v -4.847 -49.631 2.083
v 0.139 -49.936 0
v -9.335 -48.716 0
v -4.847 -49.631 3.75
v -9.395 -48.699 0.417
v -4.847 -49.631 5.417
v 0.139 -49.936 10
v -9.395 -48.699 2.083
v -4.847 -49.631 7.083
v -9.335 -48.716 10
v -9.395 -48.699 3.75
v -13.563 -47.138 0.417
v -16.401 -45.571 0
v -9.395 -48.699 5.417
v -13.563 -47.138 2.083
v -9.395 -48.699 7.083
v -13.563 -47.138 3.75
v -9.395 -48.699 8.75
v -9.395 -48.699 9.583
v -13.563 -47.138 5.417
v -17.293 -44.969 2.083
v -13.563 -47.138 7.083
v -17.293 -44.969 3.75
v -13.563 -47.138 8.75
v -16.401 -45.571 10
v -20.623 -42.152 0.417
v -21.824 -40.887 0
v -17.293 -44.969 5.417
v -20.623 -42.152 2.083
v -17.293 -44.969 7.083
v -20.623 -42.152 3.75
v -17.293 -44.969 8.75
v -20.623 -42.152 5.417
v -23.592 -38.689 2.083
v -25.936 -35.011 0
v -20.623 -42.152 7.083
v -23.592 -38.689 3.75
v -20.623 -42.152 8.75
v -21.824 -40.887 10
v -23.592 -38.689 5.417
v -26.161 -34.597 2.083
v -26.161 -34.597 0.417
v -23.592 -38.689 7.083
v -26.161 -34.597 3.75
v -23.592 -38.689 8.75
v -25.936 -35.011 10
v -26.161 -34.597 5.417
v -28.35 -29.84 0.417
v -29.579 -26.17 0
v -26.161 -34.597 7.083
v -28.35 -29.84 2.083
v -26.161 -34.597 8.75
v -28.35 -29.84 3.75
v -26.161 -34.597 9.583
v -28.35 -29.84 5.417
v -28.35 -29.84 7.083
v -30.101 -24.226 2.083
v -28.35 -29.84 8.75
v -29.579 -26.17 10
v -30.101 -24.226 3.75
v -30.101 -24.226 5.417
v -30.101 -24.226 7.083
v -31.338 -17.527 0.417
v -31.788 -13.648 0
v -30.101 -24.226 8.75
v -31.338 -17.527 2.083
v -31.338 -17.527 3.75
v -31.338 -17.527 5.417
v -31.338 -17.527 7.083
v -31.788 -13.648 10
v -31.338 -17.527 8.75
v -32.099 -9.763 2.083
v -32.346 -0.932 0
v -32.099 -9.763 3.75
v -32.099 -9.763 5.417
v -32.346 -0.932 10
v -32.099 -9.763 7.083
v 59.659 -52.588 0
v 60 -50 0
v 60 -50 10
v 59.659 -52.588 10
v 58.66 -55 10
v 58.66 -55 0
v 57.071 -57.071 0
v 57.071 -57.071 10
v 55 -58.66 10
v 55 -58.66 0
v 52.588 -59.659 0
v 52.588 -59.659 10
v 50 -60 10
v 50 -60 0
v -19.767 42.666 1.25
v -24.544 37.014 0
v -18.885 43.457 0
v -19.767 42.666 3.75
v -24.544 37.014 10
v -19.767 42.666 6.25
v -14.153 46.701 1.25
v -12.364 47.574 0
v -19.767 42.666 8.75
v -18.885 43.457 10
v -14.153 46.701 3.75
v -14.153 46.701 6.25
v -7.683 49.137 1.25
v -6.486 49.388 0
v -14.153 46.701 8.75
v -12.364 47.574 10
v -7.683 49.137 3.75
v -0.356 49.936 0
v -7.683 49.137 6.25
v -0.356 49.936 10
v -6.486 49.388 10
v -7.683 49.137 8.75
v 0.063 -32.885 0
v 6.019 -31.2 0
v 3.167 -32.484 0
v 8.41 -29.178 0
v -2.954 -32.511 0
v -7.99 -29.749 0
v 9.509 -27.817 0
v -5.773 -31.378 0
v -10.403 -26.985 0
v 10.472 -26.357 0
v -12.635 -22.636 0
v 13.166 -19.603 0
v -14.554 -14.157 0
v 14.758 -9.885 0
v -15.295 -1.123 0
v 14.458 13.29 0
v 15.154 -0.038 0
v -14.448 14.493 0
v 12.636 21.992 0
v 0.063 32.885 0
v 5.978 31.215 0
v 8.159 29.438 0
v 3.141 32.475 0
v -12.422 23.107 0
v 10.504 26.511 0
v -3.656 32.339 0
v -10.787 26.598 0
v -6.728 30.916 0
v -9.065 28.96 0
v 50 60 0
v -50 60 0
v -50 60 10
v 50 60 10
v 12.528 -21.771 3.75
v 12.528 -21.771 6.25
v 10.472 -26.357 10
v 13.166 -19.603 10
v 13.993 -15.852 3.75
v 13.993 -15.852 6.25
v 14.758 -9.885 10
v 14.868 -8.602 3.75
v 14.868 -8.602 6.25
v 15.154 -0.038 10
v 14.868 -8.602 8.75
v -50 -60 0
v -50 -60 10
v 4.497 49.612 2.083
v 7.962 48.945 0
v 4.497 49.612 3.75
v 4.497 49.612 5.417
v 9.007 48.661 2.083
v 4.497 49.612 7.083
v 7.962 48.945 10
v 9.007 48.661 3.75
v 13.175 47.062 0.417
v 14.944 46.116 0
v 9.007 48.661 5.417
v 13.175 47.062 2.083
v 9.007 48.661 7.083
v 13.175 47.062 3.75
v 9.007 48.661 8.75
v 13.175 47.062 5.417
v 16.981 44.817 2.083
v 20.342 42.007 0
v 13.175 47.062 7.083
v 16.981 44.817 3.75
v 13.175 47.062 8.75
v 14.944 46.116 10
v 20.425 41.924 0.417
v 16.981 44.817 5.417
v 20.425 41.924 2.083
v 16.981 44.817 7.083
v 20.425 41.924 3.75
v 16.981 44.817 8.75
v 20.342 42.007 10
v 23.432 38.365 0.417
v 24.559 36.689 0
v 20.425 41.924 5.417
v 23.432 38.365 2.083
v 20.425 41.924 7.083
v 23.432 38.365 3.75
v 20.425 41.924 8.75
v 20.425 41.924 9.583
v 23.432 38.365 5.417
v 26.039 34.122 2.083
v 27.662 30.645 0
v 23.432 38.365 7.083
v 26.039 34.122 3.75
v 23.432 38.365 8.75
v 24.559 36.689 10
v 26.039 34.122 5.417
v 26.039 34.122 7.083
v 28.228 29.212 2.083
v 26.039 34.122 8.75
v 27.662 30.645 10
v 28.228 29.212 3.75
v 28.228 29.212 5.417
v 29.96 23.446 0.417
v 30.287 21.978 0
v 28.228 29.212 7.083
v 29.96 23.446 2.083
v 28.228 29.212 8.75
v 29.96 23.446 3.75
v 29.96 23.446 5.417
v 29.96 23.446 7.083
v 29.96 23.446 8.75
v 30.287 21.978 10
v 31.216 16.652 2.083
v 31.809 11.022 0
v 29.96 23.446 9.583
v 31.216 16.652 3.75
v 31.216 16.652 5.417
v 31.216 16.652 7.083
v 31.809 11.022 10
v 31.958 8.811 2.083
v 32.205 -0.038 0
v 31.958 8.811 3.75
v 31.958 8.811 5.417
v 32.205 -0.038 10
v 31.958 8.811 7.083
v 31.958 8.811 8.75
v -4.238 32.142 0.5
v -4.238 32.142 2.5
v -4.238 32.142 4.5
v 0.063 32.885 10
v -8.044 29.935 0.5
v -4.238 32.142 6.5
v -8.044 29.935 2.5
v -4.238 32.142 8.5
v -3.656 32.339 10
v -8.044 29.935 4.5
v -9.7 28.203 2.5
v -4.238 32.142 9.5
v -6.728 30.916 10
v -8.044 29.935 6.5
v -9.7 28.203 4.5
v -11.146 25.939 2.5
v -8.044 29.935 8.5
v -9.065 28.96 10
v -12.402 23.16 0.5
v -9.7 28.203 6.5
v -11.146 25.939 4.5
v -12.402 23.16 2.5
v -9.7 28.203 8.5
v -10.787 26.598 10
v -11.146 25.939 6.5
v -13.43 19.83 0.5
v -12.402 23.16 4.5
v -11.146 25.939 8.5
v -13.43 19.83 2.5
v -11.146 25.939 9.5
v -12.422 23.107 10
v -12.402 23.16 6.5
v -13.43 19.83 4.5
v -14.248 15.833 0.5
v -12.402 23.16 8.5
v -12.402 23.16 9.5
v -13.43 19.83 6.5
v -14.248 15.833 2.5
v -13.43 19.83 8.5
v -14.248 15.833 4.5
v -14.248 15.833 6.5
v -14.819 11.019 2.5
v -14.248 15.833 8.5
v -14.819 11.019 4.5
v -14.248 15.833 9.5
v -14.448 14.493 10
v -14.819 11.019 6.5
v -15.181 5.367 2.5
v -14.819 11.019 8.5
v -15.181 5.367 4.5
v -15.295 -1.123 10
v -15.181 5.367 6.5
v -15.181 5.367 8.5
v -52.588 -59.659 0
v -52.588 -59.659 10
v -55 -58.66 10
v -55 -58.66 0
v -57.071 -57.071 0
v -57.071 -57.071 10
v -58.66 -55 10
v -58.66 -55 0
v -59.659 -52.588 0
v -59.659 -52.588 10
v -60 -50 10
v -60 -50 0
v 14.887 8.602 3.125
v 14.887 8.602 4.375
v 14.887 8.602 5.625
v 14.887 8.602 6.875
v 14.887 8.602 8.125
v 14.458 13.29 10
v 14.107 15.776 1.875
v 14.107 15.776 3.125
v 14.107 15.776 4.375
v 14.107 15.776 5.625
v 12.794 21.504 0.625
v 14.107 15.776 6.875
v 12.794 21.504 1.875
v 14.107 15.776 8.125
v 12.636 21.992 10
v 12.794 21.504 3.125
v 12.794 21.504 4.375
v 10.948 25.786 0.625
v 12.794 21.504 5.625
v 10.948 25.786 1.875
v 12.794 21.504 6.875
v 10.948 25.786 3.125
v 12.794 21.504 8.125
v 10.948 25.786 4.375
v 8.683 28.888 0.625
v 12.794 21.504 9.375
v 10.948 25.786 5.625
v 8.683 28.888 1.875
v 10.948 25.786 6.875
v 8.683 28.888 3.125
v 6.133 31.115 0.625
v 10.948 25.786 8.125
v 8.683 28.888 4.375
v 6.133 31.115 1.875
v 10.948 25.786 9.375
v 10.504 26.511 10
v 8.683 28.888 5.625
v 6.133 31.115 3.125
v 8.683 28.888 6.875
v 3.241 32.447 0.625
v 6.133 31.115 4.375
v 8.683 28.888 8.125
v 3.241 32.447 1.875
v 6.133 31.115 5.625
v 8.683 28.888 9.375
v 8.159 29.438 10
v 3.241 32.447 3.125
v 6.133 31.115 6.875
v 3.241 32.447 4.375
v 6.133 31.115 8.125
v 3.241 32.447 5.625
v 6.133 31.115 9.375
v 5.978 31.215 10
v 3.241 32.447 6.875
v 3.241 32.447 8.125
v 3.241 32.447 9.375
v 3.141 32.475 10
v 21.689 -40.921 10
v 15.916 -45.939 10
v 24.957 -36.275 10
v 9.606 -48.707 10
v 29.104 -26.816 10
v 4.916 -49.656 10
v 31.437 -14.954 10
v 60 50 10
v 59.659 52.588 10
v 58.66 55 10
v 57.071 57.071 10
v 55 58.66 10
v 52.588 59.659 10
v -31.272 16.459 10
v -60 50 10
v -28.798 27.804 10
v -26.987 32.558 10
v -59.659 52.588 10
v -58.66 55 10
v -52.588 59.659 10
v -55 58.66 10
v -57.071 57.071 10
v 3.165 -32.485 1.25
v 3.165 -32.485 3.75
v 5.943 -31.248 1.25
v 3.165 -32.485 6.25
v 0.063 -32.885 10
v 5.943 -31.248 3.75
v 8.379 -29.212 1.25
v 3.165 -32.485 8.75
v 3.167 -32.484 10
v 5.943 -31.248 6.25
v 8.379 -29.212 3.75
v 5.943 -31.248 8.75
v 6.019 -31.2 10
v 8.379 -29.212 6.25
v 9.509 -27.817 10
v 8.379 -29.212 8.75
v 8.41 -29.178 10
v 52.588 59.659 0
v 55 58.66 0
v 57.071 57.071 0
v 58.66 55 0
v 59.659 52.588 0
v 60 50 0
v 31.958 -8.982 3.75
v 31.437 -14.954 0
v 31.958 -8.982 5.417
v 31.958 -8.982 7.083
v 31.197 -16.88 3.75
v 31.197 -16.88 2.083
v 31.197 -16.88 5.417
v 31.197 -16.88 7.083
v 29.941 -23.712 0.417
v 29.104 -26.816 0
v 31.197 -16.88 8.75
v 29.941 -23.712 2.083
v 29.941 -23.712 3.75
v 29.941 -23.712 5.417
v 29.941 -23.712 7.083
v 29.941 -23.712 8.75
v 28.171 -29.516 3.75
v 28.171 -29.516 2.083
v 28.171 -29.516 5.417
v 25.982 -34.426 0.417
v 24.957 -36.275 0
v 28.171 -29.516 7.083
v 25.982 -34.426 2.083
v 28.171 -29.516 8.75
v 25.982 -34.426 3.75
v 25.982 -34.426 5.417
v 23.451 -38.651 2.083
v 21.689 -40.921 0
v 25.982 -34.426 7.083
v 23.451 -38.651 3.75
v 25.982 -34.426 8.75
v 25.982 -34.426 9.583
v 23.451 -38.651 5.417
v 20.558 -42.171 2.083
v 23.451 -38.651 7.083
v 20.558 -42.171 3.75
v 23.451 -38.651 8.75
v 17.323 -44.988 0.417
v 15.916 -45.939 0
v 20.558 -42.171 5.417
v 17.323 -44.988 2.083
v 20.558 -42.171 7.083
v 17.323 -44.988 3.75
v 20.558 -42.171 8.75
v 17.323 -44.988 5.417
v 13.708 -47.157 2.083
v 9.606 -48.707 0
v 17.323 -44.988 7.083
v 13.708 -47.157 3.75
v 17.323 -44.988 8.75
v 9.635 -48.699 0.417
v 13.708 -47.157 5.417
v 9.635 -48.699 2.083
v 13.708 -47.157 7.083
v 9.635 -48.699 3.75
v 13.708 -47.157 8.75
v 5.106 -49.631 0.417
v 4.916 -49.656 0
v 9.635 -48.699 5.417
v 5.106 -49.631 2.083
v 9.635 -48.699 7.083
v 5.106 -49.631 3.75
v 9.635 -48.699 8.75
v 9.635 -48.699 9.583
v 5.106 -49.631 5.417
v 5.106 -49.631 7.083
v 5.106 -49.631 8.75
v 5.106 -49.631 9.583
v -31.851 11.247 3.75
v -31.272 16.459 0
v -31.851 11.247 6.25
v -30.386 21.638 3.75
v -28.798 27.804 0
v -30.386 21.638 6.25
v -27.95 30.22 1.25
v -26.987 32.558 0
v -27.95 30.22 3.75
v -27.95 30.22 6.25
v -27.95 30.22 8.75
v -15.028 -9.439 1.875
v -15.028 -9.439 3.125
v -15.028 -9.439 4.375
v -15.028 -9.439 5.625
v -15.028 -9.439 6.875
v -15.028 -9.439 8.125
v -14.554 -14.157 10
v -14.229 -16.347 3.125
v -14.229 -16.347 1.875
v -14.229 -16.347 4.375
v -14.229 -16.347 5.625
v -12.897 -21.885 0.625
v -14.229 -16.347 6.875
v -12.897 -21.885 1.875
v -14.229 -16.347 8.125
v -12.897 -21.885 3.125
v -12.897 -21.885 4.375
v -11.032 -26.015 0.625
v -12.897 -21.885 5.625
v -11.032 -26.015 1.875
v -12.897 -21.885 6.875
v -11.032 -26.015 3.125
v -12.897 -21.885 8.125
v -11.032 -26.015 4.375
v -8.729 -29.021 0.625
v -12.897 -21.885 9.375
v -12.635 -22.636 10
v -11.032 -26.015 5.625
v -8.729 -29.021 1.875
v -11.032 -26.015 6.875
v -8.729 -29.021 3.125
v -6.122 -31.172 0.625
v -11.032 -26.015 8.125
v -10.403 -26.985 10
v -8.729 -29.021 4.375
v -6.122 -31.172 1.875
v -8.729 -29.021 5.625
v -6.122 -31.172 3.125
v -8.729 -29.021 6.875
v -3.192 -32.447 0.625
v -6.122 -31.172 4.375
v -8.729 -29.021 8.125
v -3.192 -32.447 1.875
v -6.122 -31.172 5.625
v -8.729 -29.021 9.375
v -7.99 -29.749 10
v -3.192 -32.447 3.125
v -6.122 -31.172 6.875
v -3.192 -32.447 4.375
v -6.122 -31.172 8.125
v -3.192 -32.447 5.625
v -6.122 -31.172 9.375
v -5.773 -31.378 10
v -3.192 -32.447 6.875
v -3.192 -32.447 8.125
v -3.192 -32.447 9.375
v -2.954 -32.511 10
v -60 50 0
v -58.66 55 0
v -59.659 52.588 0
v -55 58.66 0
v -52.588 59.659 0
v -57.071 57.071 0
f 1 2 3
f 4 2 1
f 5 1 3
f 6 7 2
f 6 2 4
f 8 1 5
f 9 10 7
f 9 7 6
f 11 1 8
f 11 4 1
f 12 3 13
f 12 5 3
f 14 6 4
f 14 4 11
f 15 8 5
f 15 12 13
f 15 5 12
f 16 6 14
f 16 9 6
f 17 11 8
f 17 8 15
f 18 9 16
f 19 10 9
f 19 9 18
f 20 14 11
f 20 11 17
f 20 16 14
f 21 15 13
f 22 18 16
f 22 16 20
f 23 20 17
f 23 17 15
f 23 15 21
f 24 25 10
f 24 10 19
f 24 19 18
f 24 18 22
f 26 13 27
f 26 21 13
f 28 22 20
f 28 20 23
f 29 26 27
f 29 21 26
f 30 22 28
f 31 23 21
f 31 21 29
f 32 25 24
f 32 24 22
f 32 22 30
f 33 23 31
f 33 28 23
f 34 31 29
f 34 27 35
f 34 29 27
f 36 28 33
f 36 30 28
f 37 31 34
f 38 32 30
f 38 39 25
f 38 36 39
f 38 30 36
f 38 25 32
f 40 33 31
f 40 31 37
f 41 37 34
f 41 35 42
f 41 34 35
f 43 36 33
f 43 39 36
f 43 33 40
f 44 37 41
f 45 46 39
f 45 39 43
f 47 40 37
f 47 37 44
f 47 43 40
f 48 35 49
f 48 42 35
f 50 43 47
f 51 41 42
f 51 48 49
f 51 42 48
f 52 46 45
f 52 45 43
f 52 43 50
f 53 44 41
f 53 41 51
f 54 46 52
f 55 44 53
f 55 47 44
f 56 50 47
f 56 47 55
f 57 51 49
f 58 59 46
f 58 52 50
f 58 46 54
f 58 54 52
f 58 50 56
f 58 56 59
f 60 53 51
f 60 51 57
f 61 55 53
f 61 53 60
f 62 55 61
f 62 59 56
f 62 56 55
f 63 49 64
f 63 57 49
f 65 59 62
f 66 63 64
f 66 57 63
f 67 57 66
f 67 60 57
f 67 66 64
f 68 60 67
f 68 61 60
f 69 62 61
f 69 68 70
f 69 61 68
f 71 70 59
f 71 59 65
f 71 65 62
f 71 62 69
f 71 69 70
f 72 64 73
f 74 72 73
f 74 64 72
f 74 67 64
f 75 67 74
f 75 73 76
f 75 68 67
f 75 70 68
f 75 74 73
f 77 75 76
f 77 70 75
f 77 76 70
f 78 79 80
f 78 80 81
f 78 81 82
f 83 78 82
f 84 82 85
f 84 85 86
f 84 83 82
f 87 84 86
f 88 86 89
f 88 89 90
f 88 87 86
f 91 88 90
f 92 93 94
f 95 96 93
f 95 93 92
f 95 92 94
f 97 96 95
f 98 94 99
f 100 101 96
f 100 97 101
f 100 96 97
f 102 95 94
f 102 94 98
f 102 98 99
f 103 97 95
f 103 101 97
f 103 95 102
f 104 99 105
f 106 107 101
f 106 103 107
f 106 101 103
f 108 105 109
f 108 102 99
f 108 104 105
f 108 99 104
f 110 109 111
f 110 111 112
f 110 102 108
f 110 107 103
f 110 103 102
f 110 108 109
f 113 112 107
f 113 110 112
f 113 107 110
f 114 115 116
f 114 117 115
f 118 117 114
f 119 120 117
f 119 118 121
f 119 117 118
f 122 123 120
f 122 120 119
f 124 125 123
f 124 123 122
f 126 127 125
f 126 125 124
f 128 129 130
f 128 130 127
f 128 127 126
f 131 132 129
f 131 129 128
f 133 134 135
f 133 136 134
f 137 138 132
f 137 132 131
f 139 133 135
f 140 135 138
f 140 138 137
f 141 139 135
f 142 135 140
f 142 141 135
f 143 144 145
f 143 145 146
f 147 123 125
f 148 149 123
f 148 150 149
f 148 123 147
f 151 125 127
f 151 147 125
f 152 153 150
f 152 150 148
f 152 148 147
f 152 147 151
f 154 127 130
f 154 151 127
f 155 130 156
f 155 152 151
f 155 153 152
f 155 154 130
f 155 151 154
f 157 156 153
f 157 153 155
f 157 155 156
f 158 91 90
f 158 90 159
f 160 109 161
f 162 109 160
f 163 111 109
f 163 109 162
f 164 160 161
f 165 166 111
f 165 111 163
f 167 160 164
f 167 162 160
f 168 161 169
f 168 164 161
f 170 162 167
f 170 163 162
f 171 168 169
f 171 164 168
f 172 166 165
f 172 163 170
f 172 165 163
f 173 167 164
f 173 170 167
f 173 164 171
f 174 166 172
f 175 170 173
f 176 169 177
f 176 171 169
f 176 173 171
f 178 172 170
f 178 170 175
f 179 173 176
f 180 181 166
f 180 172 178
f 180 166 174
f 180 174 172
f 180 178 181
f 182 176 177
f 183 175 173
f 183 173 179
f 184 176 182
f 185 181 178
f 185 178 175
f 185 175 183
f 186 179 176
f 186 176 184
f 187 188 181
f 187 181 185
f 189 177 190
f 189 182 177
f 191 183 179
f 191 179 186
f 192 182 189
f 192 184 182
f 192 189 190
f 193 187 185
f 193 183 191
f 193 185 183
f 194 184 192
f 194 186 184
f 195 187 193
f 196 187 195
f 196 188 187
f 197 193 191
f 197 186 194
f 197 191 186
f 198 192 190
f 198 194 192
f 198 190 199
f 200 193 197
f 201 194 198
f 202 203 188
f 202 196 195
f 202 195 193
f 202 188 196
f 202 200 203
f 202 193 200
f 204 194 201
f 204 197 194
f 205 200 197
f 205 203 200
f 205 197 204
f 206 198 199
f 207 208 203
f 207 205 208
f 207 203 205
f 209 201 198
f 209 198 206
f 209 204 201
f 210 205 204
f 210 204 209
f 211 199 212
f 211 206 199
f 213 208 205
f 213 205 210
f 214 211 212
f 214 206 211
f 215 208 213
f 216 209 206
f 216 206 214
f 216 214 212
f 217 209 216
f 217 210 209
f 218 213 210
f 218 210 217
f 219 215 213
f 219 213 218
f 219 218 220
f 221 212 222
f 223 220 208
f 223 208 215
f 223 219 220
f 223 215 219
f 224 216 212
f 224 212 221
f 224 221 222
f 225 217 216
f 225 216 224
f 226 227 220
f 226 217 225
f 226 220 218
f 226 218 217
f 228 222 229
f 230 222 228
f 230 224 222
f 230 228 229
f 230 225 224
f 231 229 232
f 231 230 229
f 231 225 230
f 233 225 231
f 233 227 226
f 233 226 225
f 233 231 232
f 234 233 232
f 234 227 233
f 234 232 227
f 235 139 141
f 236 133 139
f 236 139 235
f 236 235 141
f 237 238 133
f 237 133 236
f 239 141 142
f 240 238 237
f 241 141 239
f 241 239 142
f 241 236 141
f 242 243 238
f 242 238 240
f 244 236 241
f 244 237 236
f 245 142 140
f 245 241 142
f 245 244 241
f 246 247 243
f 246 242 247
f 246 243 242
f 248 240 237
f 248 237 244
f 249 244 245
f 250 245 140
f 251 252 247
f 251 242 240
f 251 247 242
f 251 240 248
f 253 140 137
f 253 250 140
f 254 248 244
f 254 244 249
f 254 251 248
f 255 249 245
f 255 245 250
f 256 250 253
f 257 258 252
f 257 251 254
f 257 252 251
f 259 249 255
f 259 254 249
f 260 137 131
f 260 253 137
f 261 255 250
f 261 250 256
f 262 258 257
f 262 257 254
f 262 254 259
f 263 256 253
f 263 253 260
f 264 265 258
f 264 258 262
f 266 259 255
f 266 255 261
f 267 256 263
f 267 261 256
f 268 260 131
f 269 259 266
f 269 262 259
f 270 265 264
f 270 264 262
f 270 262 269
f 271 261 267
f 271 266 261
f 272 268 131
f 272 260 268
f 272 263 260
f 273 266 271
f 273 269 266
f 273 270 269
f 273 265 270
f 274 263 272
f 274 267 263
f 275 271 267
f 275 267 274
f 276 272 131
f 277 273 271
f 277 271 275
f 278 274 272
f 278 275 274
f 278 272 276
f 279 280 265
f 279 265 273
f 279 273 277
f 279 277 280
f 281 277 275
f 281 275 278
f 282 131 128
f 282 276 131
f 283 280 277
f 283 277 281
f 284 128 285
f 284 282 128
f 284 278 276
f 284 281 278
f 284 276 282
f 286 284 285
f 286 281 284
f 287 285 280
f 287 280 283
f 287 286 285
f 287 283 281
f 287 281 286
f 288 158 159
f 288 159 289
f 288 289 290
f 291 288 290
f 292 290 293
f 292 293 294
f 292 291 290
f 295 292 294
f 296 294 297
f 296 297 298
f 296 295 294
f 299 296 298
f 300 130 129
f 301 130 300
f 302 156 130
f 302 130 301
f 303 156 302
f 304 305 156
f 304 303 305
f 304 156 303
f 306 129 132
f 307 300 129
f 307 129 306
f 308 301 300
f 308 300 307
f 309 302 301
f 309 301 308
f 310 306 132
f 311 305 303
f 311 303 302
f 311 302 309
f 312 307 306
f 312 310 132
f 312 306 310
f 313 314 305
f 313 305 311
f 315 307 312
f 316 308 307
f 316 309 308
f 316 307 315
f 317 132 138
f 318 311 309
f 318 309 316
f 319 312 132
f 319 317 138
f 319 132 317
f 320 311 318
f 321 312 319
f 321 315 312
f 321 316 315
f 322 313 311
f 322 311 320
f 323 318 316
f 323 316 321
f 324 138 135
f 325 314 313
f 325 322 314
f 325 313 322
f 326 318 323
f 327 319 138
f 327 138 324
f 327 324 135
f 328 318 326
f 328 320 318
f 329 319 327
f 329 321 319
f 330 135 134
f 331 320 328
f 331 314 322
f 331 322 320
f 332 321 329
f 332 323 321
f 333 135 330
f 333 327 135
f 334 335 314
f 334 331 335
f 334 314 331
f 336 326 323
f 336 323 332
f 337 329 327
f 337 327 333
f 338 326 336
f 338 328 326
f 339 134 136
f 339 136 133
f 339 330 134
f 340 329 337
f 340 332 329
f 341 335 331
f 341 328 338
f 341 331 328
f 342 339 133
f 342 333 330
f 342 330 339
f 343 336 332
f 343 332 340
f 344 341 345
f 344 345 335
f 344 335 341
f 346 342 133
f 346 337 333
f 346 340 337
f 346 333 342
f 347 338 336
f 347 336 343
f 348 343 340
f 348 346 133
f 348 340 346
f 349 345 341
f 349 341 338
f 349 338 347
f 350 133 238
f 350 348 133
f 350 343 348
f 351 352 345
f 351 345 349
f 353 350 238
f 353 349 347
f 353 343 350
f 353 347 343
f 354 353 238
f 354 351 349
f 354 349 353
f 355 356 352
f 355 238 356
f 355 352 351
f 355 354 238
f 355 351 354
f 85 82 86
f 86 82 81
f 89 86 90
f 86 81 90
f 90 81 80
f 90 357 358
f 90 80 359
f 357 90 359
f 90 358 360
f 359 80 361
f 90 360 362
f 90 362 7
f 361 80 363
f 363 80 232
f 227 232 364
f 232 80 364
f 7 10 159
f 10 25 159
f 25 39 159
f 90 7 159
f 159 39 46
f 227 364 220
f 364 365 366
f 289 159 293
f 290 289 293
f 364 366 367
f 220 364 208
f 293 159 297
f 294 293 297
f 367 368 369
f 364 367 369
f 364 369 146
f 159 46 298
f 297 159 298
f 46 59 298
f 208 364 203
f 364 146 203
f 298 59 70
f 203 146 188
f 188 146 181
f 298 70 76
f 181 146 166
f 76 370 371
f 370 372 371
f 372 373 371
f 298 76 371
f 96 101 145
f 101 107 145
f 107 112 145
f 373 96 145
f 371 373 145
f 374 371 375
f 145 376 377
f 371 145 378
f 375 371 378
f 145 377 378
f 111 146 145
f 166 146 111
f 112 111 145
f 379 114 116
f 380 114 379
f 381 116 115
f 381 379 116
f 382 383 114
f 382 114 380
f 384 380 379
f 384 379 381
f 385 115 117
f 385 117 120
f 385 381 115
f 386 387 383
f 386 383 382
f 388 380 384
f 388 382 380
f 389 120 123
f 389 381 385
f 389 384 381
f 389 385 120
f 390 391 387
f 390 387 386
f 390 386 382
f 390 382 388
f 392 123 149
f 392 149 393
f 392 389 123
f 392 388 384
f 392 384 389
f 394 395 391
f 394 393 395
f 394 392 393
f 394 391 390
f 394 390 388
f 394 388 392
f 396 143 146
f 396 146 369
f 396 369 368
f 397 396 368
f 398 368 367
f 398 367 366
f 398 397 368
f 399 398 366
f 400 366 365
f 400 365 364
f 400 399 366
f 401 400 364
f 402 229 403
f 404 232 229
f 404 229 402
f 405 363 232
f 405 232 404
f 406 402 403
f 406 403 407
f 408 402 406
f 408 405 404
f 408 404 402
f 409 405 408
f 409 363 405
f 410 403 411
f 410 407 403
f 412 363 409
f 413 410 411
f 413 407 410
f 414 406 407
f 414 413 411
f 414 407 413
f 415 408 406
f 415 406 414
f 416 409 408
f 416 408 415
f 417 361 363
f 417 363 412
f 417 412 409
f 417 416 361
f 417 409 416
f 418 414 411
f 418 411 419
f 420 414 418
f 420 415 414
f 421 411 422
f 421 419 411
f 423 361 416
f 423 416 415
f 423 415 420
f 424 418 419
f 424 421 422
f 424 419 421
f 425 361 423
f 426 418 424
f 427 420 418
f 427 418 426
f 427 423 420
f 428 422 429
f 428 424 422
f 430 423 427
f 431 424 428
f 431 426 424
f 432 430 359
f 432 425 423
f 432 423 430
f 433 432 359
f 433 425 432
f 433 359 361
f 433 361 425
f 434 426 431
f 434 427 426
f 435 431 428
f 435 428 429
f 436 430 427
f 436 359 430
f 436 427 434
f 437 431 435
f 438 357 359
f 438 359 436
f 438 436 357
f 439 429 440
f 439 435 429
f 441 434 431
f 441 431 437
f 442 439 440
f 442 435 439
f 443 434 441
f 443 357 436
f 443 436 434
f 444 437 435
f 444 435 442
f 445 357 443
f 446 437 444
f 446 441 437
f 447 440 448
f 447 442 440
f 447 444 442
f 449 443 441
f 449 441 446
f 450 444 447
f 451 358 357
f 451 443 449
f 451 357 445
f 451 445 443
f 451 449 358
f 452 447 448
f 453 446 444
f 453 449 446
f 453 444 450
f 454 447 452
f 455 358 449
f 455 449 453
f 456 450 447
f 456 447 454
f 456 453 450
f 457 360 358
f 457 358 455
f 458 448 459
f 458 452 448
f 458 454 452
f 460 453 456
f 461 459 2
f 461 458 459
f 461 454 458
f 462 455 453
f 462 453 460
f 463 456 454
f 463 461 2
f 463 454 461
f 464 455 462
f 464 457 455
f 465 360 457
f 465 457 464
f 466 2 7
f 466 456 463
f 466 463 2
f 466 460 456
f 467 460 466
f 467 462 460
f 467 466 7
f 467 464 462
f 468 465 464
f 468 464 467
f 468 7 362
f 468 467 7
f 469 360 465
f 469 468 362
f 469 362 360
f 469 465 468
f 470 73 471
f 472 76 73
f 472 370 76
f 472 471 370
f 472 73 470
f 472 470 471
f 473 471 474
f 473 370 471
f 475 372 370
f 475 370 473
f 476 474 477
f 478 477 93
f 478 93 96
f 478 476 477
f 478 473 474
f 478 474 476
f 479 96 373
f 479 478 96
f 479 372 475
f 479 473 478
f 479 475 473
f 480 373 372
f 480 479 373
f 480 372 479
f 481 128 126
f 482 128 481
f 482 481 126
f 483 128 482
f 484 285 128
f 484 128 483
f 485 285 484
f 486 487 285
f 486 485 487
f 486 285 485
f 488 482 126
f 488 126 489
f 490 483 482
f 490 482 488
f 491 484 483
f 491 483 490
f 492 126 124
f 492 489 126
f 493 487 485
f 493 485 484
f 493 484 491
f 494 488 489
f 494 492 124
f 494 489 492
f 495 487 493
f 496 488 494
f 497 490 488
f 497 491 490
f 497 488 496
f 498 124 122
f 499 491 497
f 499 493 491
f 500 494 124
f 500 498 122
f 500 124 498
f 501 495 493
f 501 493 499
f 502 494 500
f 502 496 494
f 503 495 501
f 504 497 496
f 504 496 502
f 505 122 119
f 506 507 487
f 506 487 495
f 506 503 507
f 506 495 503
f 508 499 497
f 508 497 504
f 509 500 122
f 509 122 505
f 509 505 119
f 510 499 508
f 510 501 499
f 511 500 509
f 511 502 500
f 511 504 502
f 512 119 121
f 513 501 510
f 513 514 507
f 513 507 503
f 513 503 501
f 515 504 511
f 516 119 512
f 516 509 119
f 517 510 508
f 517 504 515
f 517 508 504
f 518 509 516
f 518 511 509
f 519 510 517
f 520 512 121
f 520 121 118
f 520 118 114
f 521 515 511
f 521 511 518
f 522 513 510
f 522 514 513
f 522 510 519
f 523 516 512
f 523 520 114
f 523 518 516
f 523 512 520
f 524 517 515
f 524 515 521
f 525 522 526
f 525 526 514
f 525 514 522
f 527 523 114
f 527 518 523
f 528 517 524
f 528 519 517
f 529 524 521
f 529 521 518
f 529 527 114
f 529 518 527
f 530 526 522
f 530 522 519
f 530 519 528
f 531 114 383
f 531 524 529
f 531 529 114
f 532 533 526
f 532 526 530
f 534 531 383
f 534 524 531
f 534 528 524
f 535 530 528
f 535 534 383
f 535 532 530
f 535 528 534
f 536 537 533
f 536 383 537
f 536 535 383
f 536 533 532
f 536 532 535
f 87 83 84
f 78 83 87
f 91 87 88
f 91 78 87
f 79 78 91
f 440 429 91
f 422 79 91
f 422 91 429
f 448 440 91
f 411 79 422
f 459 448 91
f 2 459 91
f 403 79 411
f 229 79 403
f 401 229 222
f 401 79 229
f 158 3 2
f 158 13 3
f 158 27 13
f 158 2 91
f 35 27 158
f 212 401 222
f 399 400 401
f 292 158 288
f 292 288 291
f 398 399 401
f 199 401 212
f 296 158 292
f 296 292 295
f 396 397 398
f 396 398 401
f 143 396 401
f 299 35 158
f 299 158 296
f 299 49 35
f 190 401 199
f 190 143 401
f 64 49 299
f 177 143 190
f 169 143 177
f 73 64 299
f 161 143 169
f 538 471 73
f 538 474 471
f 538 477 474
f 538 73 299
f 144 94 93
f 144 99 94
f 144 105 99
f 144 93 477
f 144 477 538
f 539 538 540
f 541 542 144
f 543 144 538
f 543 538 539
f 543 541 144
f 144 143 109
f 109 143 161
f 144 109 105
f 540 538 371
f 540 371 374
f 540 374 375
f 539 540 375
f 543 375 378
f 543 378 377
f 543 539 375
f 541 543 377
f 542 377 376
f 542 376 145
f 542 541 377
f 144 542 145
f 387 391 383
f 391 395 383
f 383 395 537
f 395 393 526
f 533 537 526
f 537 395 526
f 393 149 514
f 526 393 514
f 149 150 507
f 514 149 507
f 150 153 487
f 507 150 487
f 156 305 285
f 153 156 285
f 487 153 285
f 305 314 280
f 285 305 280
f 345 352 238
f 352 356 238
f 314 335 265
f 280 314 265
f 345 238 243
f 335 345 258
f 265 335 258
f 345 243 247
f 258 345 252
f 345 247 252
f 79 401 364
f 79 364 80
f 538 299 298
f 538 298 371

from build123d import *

# Parameters (mm, degrees)
BOSS_EXTRUDE1_DEPTH = 10
CUT_EXTRUDE9_DEPTH  = 10


with BuildPart() as part:
    # Sketch1 → Boss-Extrude1 (new body)
    with BuildSketch(Plane.XY):
        with BuildLine():
            Line((-50, 60), (50, 60))
            ThreePointArc((50, 60), (57.071067812, 57.071067812), (60, 50))
            Line((60, 50), (60, -50))
            ThreePointArc((60, -50), (57.071067812, -57.071067812), (50, -60))
            Line((50, -60), (-50, -60))
            ThreePointArc((-50, -60), (-57.071067812, -57.071067812), (-60, -50))
            Line((-60, -50), (-60, 50))
            ThreePointArc((-60, 50), (-57.071067812, 57.071067812), (-50, 60))
        make_face()
    extrude(amount=BOSS_EXTRUDE1_DEPTH)

    # Sketch2 → Cut-Extrude9 (cut)
    with BuildSketch(Plane.XY.offset(10)):
        with BuildLine():
            add(Edge.make_bspline(
                [(-0.355969551, 49.935897436), (0.469383272, 49.923644841), (2.092247439, 49.899552965), (4.482420878, 49.638618324), (6.78481874, 49.244418855), (9.008448293, 48.694648055), (11.137303626, 47.967045984), (13.186878987, 47.096118777), (15.132778499, 46.036184508), (16.999818598, 44.838934314), (18.787280098, 43.483477371), (20.452202613, 41.938186469), (22.024991165, 40.238618816), (23.471600674, 38.359079999), (24.824066748, 36.316666414), (26.077945411, 34.111054202), (27.223637911, 31.731448367), (28.273984728, 29.173554722), (29.213208168, 26.399031546), (30.004314908, 23.376053852), (30.682821314, 20.103931296), (31.255528594, 16.574519064), (31.688402734, 12.783125727), (31.980168618, 8.732270097), (32.180392178, 4.429761628), (32.19673303, 1.47827617), (32.205128205, -0.038060897)],
                knots=[0, 0, 0, 0, 0.879237366, 1.728815576, 2.559023295, 3.367336655, 4.166867292, 4.954216142, 5.737608147, 6.525189134, 7.316157332, 8.124696809, 8.942788509, 9.781158001, 10.649253743, 11.551476218, 12.482711956, 13.461909668, 14.496590415, 15.601789533, 16.789733467, 18.056700938, 19.410929216, 20.8549011, 22.384193279, 24, 24, 24, 24], degree=3))
            add(Edge.make_bspline(
                [(32.205128205, -0.038060897), (32.196055289, -1.573369046), (32.178426775, -4.556445238), (31.98849197, -8.898306638), (31.661415261, -12.97857391), (31.239855194, -16.796824928), (30.662433215, -20.351043334), (29.986191811, -23.650432162), (29.182597691, -26.693795466), (28.212436531, -29.474275901), (27.168447487, -32.036661767), (26.019621026, -34.411627937), (24.785981031, -36.605607132), (23.495823484, -38.651698514), (22.078417204, -40.489584347), (20.602751349, -42.181762361), (19.004572794, -43.663775323), (17.351171034, -45.011999532), (15.581975276, -46.177135811), (13.715230768, -47.19614479), (11.717656699, -48.022682101), (9.625665447, -48.741560107), (7.403598595, -49.257636949), (5.086764482, -49.667126963), (2.649006517, -49.893436261), (0.989282707, -49.921511419), (0.138822115, -49.935897436)],
                knots=[0, 0, 0, 0, 1.643780988, 3.193836972, 4.651895693, 6.025988579, 7.305620092, 8.505800249, 9.631074763, 10.672816429, 11.65661981, 12.592235626, 13.49536222, 14.350718032, 15.179365177, 15.97804903, 16.751647189, 17.51006938, 18.259804725, 19.016521909, 19.783502495, 20.571750527, 21.382245291, 22.22305063, 23.089471752, 24, 24, 24, 24], degree=3))
            add(Edge.make_bspline(
                [(0.138822115, -49.935897436), (-0.711615522, -49.921233922), (-2.377610346, -49.892508314), (-4.82196025, -49.668809668), (-7.151072419, -49.255978097), (-9.390719391, -48.73759805), (-11.525313574, -48.02427269), (-13.565090283, -47.173005975), (-15.494365399, -46.160355104), (-17.318480783, -44.992504168), (-19.031208385, -43.653300599), (-20.659163982, -42.157068682), (-22.198746442, -40.50760098), (-23.626534898, -38.686422088), (-24.965912393, -36.717840949), (-26.202911339, -34.579377322), (-27.33678833, -32.27414476), (-28.403011249, -29.798930006), (-29.329424003, -27.100444523), (-30.153888339, -24.15459118), (-30.829267837, -20.936813858), (-31.372453222, -17.448146304), (-31.806132121, -13.695979411), (-32.128739375, -9.678502118), (-32.319729182, -5.393843179), (-32.337172823, -2.448783662), (-32.346153846, -0.932491987)],
                knots=[0, 0, 0, 0, 0.917216111, 1.796812873, 2.643793957, 3.46689424, 4.273913431, 5.068098542, 5.848489301, 6.620921603, 7.401012384, 8.190319798, 9.003608147, 9.831726257, 10.68377682, 11.569763213, 12.493818149, 13.453288342, 14.474581811, 15.568529029, 16.750744269, 18.018426408, 19.375425659, 20.823733699, 22.36466933, 24, 24, 24, 24], degree=3))
            add(Edge.make_bspline(
                [(-32.346153846, -0.932491987), (-32.329885562, 1.174275928), (-32.298495698, 5.239311758), (-31.900700289, 11.112106626), (-31.31683752, 16.540488165), (-30.459281419, 21.515376031), (-29.398925159, 26.055195758), (-28.041083756, 30.130041389), (-26.495280093, 33.796297553), (-25.178056781, 35.968209776), (-24.543669872, 37.014222756)],
                knots=[0, 0, 0, 0, 1.288568992, 2.486310467, 3.599230591, 4.627010532, 5.572937695, 6.447898582, 7.252493626, 8, 8, 8, 8], degree=3))
            add(Edge.make_bspline(
                [(-24.543669872, 37.014222756), (-23.806034991, 38.041825582), (-22.363813448, 40.050991593), (-19.842048768, 42.688651004), (-17.132740948, 44.944506494), (-14.180242351, 46.767506031), (-11.031247971, 48.205123615), (-7.658722091, 49.220496723), (-4.075118883, 49.812100409), (-1.614198783, 49.894015537), (-0.355969551, 49.935897436)],
                knots=[0, 0, 0, 0, 1.058512271, 2.069600068, 3.047294572, 4.004278952, 4.967380941, 5.939006123, 6.946246673, 8, 8, 8, 8], degree=3))
        make_face()
        with BuildLine():
            add(Edge.make_bspline(
                [(0.062700321, 32.884615385), (-0.683425475, 32.849250505), (-2.146228103, 32.779916569), (-4.268824412, 32.191369271), (-6.270300203, 31.282326235), (-7.79276938, 30.188435071), (-8.932322417, 29.139809208), (-9.728536295, 28.190836906), (-10.49635909, 27.13185221), (-11.174538847, 25.915068584), (-11.814917568, 24.584206505), (-12.440760604, 23.133224653), (-12.953787556, 21.526483777), (-13.457822935, 19.791346881), (-13.899404957, 17.879842038), (-14.269353885, 15.776344805), (-14.599870734, 13.467175948), (-14.830410177, 10.950822957), (-15.045342122, 8.229918558), (-15.199415519, 5.298401631), (-15.263829739, 2.157063038), (-15.28430506, -0.006330233), (-15.294871795, -1.122796474)],
                knots=[0, 0, 0, 0, 1.076674018, 2.110852608, 3.161083442, 4.239746716, 4.804137807, 5.395870207, 6.026861976, 6.692161227, 7.405688833, 8.16177676, 8.973626916, 9.841385931, 10.773283133, 11.807421078, 12.927755683, 14.143907515, 15.458935494, 16.872852025, 18.386167141, 20, 20, 20, 20], degree=3))
            add(Edge.make_bspline(
                [(-15.294871795, -1.122796474), (-15.277480231, -2.569232463), (-15.244130617, -5.342880716), (-15.069460926, -9.33148348), (-14.719350027, -12.961433168), (-14.283882757, -16.257331292), (-13.672251194, -19.19780307), (-12.968529489, -21.810668093), (-12.099495755, -24.062618675), (-11.095159828, -25.986223088), (-9.982812536, -27.622629365), (-8.775310618, -29.01358207), (-7.513765188, -30.218081489), (-6.158799311, -31.196481524), (-4.71364553, -31.94628221), (-3.19036822, -32.485604584), (-1.587999362, -32.815746269), (-0.490713686, -32.861526307), (0.062700321, -32.884615385)],
                knots=[0, 0, 0, 0, 1.771748488, 3.397459088, 4.888034009, 6.237357457, 7.467047327, 8.564189669, 9.548206622, 10.417051504, 11.216568818, 11.965764335, 12.669334354, 13.348544111, 14.005342236, 14.656555988, 15.322436492, 16, 16, 16, 16], degree=3))
            add(Edge.make_bspline(
                [(0.062700321, -32.884615385), (0.597122912, -32.868816122), (1.643455894, -32.837883131), (3.169243716, -32.520360132), (4.612137098, -32.004136701), (5.967779494, -31.273902417), (7.241019849, -30.345297795), (8.425635348, -29.214242154), (9.51269186, -27.869461502), (10.146015918, -26.871435372), (10.472355769, -26.357171474)],
                knots=[0, 0, 0, 0, 0.992283464, 1.942767638, 2.88273346, 3.832339453, 4.79467288, 5.803907806, 6.868395428, 8, 8, 8, 8], degree=3))
            add(Edge.make_bspline(
                [(10.472355769, -26.357171474), (10.856565983, -25.654446294), (11.662223642, -24.18088858), (12.594532076, -21.694314882), (13.379297353, -18.889870725), (14.054733351, -15.758828412), (14.516690372, -12.288838726), (14.914527194, -8.501905171), (15.106413779, -4.378958283), (15.137625178, -1.522565806), (15.153846154, -0.038060897)],
                knots=[0, 0, 0, 0, 0.710965849, 1.490837728, 2.352621235, 3.297892224, 4.334225155, 5.461620853, 6.680770821, 8, 8, 8, 8], degree=3))
            add(Edge.make_bspline(
                [(15.153846154, -0.038060897), (15.147580341, 1.45933023), (15.135519722, 4.341552532), (14.914242276, 8.479321703), (14.606096526, 12.258487118), (14.15536825, 15.670611435), (13.575424398, 18.723977801), (12.860641413, 21.418386611), (12.017965444, 23.759148028), (11.01865217, 25.743927991), (9.91185063, 27.430718692), (8.736947008, 28.877854275), (7.488973334, 30.113382125), (6.170016624, 31.14195175), (4.749549166, 31.927856087), (3.254703739, 32.482769565), (1.682415797, 32.818473609), (0.609892831, 32.862270544), (0.062700321, 32.884615385)],
                knots=[0, 0, 0, 0, 1.793836731, 3.452829483, 4.963243077, 6.335886805, 7.574563692, 8.684454726, 9.672768357, 10.54971625, 11.340229787, 12.085688095, 12.778991901, 13.440269426, 14.083255152, 14.715733572, 15.344777694, 16, 16, 16, 16], degree=3))
        make_face(mode=Mode.SUBTRACT)
    extrude(amount=-CUT_EXTRUDE9_DEPTH, mode=Mode.SUBTRACT)


with BuildPart() as cut_extrude9_piece_1:
    # of the separate pieces the step leaves, piece 1, a body of its own (cut_extrude9_pieces)
    add(part.part.solids().sort_by_distance((-50, 60, 0))[0])


with BuildPart() as cut_extrude9_piece_2:
    # of the separate pieces the step leaves, piece 2, a body of its own (cut_extrude9_pieces)
    add(part.part.solids().sort_by_distance((0.062700321, 32.884615385, 0))[0])


solid = Compound([cut_extrude9_piece_1.part, cut_extrude9_piece_2.part])
